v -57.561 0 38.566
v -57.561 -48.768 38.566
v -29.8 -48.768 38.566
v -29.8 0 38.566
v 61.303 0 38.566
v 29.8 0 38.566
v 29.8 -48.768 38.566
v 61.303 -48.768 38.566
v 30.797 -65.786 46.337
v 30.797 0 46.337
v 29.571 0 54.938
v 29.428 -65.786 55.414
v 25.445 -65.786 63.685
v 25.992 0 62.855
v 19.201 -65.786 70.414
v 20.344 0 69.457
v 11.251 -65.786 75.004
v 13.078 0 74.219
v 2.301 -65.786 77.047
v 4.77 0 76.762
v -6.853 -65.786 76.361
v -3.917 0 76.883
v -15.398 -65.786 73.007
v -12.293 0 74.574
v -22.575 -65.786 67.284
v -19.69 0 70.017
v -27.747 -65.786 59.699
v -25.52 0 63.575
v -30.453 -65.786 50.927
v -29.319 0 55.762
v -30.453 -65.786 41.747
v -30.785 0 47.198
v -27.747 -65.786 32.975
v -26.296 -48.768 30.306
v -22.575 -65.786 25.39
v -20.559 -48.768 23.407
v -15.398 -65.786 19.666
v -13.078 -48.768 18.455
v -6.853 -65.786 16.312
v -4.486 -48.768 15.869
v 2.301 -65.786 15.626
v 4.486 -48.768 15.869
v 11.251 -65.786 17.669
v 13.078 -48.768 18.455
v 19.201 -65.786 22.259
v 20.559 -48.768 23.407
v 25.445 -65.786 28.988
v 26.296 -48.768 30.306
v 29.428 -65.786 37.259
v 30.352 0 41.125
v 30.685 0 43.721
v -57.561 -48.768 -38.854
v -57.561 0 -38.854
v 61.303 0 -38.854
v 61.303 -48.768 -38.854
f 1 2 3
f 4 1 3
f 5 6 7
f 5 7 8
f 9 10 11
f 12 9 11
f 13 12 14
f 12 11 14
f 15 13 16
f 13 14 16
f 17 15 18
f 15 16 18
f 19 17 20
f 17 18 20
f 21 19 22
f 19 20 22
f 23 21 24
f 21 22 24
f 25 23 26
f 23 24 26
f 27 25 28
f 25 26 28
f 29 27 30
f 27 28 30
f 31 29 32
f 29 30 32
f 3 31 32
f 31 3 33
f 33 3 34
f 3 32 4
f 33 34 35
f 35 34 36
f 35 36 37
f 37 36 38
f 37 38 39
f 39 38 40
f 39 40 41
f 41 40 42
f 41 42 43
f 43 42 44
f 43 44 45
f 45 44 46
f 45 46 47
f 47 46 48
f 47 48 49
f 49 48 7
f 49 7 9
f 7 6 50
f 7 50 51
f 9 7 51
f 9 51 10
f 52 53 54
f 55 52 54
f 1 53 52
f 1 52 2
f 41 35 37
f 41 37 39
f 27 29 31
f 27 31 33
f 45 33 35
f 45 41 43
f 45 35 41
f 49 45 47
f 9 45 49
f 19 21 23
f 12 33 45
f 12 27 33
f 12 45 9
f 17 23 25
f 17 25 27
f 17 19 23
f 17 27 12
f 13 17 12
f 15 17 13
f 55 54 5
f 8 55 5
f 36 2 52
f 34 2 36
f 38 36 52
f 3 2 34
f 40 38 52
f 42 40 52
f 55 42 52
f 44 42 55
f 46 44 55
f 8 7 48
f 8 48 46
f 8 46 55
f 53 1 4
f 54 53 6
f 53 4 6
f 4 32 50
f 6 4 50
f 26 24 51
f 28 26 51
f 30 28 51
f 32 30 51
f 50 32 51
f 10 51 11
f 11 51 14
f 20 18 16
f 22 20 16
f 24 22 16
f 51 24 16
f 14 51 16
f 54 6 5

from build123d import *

# Parameters (mm, degrees)
F0_W     = 118.8637800515
F0_H     = 77.4197466671
F1_DEPTH = 48.768
F4_R     = 30.7965572654
F5_DEPTH = 65.786


# Not quite as in the source:
# - the program builds the solid bodies; features that only make, move or delete a surface that nothing else refers to are left out


with BuildPart() as f1:
    # F0 (on Front) → F1 (new body)
    with BuildSketch(Plane.XZ):
        with Locations((1.8707383424, -0.1439023763)):
            Rectangle(F0_W, F0_H)
    extrude(amount=F1_DEPTH)

    # F4 (on Front) → F5 (join)
    with BuildSketch(Plane.XZ):
        with Locations((0, 46.3367253542)):
            Circle(F4_R)
    extrude(amount=F5_DEPTH)


solid = f1.part
